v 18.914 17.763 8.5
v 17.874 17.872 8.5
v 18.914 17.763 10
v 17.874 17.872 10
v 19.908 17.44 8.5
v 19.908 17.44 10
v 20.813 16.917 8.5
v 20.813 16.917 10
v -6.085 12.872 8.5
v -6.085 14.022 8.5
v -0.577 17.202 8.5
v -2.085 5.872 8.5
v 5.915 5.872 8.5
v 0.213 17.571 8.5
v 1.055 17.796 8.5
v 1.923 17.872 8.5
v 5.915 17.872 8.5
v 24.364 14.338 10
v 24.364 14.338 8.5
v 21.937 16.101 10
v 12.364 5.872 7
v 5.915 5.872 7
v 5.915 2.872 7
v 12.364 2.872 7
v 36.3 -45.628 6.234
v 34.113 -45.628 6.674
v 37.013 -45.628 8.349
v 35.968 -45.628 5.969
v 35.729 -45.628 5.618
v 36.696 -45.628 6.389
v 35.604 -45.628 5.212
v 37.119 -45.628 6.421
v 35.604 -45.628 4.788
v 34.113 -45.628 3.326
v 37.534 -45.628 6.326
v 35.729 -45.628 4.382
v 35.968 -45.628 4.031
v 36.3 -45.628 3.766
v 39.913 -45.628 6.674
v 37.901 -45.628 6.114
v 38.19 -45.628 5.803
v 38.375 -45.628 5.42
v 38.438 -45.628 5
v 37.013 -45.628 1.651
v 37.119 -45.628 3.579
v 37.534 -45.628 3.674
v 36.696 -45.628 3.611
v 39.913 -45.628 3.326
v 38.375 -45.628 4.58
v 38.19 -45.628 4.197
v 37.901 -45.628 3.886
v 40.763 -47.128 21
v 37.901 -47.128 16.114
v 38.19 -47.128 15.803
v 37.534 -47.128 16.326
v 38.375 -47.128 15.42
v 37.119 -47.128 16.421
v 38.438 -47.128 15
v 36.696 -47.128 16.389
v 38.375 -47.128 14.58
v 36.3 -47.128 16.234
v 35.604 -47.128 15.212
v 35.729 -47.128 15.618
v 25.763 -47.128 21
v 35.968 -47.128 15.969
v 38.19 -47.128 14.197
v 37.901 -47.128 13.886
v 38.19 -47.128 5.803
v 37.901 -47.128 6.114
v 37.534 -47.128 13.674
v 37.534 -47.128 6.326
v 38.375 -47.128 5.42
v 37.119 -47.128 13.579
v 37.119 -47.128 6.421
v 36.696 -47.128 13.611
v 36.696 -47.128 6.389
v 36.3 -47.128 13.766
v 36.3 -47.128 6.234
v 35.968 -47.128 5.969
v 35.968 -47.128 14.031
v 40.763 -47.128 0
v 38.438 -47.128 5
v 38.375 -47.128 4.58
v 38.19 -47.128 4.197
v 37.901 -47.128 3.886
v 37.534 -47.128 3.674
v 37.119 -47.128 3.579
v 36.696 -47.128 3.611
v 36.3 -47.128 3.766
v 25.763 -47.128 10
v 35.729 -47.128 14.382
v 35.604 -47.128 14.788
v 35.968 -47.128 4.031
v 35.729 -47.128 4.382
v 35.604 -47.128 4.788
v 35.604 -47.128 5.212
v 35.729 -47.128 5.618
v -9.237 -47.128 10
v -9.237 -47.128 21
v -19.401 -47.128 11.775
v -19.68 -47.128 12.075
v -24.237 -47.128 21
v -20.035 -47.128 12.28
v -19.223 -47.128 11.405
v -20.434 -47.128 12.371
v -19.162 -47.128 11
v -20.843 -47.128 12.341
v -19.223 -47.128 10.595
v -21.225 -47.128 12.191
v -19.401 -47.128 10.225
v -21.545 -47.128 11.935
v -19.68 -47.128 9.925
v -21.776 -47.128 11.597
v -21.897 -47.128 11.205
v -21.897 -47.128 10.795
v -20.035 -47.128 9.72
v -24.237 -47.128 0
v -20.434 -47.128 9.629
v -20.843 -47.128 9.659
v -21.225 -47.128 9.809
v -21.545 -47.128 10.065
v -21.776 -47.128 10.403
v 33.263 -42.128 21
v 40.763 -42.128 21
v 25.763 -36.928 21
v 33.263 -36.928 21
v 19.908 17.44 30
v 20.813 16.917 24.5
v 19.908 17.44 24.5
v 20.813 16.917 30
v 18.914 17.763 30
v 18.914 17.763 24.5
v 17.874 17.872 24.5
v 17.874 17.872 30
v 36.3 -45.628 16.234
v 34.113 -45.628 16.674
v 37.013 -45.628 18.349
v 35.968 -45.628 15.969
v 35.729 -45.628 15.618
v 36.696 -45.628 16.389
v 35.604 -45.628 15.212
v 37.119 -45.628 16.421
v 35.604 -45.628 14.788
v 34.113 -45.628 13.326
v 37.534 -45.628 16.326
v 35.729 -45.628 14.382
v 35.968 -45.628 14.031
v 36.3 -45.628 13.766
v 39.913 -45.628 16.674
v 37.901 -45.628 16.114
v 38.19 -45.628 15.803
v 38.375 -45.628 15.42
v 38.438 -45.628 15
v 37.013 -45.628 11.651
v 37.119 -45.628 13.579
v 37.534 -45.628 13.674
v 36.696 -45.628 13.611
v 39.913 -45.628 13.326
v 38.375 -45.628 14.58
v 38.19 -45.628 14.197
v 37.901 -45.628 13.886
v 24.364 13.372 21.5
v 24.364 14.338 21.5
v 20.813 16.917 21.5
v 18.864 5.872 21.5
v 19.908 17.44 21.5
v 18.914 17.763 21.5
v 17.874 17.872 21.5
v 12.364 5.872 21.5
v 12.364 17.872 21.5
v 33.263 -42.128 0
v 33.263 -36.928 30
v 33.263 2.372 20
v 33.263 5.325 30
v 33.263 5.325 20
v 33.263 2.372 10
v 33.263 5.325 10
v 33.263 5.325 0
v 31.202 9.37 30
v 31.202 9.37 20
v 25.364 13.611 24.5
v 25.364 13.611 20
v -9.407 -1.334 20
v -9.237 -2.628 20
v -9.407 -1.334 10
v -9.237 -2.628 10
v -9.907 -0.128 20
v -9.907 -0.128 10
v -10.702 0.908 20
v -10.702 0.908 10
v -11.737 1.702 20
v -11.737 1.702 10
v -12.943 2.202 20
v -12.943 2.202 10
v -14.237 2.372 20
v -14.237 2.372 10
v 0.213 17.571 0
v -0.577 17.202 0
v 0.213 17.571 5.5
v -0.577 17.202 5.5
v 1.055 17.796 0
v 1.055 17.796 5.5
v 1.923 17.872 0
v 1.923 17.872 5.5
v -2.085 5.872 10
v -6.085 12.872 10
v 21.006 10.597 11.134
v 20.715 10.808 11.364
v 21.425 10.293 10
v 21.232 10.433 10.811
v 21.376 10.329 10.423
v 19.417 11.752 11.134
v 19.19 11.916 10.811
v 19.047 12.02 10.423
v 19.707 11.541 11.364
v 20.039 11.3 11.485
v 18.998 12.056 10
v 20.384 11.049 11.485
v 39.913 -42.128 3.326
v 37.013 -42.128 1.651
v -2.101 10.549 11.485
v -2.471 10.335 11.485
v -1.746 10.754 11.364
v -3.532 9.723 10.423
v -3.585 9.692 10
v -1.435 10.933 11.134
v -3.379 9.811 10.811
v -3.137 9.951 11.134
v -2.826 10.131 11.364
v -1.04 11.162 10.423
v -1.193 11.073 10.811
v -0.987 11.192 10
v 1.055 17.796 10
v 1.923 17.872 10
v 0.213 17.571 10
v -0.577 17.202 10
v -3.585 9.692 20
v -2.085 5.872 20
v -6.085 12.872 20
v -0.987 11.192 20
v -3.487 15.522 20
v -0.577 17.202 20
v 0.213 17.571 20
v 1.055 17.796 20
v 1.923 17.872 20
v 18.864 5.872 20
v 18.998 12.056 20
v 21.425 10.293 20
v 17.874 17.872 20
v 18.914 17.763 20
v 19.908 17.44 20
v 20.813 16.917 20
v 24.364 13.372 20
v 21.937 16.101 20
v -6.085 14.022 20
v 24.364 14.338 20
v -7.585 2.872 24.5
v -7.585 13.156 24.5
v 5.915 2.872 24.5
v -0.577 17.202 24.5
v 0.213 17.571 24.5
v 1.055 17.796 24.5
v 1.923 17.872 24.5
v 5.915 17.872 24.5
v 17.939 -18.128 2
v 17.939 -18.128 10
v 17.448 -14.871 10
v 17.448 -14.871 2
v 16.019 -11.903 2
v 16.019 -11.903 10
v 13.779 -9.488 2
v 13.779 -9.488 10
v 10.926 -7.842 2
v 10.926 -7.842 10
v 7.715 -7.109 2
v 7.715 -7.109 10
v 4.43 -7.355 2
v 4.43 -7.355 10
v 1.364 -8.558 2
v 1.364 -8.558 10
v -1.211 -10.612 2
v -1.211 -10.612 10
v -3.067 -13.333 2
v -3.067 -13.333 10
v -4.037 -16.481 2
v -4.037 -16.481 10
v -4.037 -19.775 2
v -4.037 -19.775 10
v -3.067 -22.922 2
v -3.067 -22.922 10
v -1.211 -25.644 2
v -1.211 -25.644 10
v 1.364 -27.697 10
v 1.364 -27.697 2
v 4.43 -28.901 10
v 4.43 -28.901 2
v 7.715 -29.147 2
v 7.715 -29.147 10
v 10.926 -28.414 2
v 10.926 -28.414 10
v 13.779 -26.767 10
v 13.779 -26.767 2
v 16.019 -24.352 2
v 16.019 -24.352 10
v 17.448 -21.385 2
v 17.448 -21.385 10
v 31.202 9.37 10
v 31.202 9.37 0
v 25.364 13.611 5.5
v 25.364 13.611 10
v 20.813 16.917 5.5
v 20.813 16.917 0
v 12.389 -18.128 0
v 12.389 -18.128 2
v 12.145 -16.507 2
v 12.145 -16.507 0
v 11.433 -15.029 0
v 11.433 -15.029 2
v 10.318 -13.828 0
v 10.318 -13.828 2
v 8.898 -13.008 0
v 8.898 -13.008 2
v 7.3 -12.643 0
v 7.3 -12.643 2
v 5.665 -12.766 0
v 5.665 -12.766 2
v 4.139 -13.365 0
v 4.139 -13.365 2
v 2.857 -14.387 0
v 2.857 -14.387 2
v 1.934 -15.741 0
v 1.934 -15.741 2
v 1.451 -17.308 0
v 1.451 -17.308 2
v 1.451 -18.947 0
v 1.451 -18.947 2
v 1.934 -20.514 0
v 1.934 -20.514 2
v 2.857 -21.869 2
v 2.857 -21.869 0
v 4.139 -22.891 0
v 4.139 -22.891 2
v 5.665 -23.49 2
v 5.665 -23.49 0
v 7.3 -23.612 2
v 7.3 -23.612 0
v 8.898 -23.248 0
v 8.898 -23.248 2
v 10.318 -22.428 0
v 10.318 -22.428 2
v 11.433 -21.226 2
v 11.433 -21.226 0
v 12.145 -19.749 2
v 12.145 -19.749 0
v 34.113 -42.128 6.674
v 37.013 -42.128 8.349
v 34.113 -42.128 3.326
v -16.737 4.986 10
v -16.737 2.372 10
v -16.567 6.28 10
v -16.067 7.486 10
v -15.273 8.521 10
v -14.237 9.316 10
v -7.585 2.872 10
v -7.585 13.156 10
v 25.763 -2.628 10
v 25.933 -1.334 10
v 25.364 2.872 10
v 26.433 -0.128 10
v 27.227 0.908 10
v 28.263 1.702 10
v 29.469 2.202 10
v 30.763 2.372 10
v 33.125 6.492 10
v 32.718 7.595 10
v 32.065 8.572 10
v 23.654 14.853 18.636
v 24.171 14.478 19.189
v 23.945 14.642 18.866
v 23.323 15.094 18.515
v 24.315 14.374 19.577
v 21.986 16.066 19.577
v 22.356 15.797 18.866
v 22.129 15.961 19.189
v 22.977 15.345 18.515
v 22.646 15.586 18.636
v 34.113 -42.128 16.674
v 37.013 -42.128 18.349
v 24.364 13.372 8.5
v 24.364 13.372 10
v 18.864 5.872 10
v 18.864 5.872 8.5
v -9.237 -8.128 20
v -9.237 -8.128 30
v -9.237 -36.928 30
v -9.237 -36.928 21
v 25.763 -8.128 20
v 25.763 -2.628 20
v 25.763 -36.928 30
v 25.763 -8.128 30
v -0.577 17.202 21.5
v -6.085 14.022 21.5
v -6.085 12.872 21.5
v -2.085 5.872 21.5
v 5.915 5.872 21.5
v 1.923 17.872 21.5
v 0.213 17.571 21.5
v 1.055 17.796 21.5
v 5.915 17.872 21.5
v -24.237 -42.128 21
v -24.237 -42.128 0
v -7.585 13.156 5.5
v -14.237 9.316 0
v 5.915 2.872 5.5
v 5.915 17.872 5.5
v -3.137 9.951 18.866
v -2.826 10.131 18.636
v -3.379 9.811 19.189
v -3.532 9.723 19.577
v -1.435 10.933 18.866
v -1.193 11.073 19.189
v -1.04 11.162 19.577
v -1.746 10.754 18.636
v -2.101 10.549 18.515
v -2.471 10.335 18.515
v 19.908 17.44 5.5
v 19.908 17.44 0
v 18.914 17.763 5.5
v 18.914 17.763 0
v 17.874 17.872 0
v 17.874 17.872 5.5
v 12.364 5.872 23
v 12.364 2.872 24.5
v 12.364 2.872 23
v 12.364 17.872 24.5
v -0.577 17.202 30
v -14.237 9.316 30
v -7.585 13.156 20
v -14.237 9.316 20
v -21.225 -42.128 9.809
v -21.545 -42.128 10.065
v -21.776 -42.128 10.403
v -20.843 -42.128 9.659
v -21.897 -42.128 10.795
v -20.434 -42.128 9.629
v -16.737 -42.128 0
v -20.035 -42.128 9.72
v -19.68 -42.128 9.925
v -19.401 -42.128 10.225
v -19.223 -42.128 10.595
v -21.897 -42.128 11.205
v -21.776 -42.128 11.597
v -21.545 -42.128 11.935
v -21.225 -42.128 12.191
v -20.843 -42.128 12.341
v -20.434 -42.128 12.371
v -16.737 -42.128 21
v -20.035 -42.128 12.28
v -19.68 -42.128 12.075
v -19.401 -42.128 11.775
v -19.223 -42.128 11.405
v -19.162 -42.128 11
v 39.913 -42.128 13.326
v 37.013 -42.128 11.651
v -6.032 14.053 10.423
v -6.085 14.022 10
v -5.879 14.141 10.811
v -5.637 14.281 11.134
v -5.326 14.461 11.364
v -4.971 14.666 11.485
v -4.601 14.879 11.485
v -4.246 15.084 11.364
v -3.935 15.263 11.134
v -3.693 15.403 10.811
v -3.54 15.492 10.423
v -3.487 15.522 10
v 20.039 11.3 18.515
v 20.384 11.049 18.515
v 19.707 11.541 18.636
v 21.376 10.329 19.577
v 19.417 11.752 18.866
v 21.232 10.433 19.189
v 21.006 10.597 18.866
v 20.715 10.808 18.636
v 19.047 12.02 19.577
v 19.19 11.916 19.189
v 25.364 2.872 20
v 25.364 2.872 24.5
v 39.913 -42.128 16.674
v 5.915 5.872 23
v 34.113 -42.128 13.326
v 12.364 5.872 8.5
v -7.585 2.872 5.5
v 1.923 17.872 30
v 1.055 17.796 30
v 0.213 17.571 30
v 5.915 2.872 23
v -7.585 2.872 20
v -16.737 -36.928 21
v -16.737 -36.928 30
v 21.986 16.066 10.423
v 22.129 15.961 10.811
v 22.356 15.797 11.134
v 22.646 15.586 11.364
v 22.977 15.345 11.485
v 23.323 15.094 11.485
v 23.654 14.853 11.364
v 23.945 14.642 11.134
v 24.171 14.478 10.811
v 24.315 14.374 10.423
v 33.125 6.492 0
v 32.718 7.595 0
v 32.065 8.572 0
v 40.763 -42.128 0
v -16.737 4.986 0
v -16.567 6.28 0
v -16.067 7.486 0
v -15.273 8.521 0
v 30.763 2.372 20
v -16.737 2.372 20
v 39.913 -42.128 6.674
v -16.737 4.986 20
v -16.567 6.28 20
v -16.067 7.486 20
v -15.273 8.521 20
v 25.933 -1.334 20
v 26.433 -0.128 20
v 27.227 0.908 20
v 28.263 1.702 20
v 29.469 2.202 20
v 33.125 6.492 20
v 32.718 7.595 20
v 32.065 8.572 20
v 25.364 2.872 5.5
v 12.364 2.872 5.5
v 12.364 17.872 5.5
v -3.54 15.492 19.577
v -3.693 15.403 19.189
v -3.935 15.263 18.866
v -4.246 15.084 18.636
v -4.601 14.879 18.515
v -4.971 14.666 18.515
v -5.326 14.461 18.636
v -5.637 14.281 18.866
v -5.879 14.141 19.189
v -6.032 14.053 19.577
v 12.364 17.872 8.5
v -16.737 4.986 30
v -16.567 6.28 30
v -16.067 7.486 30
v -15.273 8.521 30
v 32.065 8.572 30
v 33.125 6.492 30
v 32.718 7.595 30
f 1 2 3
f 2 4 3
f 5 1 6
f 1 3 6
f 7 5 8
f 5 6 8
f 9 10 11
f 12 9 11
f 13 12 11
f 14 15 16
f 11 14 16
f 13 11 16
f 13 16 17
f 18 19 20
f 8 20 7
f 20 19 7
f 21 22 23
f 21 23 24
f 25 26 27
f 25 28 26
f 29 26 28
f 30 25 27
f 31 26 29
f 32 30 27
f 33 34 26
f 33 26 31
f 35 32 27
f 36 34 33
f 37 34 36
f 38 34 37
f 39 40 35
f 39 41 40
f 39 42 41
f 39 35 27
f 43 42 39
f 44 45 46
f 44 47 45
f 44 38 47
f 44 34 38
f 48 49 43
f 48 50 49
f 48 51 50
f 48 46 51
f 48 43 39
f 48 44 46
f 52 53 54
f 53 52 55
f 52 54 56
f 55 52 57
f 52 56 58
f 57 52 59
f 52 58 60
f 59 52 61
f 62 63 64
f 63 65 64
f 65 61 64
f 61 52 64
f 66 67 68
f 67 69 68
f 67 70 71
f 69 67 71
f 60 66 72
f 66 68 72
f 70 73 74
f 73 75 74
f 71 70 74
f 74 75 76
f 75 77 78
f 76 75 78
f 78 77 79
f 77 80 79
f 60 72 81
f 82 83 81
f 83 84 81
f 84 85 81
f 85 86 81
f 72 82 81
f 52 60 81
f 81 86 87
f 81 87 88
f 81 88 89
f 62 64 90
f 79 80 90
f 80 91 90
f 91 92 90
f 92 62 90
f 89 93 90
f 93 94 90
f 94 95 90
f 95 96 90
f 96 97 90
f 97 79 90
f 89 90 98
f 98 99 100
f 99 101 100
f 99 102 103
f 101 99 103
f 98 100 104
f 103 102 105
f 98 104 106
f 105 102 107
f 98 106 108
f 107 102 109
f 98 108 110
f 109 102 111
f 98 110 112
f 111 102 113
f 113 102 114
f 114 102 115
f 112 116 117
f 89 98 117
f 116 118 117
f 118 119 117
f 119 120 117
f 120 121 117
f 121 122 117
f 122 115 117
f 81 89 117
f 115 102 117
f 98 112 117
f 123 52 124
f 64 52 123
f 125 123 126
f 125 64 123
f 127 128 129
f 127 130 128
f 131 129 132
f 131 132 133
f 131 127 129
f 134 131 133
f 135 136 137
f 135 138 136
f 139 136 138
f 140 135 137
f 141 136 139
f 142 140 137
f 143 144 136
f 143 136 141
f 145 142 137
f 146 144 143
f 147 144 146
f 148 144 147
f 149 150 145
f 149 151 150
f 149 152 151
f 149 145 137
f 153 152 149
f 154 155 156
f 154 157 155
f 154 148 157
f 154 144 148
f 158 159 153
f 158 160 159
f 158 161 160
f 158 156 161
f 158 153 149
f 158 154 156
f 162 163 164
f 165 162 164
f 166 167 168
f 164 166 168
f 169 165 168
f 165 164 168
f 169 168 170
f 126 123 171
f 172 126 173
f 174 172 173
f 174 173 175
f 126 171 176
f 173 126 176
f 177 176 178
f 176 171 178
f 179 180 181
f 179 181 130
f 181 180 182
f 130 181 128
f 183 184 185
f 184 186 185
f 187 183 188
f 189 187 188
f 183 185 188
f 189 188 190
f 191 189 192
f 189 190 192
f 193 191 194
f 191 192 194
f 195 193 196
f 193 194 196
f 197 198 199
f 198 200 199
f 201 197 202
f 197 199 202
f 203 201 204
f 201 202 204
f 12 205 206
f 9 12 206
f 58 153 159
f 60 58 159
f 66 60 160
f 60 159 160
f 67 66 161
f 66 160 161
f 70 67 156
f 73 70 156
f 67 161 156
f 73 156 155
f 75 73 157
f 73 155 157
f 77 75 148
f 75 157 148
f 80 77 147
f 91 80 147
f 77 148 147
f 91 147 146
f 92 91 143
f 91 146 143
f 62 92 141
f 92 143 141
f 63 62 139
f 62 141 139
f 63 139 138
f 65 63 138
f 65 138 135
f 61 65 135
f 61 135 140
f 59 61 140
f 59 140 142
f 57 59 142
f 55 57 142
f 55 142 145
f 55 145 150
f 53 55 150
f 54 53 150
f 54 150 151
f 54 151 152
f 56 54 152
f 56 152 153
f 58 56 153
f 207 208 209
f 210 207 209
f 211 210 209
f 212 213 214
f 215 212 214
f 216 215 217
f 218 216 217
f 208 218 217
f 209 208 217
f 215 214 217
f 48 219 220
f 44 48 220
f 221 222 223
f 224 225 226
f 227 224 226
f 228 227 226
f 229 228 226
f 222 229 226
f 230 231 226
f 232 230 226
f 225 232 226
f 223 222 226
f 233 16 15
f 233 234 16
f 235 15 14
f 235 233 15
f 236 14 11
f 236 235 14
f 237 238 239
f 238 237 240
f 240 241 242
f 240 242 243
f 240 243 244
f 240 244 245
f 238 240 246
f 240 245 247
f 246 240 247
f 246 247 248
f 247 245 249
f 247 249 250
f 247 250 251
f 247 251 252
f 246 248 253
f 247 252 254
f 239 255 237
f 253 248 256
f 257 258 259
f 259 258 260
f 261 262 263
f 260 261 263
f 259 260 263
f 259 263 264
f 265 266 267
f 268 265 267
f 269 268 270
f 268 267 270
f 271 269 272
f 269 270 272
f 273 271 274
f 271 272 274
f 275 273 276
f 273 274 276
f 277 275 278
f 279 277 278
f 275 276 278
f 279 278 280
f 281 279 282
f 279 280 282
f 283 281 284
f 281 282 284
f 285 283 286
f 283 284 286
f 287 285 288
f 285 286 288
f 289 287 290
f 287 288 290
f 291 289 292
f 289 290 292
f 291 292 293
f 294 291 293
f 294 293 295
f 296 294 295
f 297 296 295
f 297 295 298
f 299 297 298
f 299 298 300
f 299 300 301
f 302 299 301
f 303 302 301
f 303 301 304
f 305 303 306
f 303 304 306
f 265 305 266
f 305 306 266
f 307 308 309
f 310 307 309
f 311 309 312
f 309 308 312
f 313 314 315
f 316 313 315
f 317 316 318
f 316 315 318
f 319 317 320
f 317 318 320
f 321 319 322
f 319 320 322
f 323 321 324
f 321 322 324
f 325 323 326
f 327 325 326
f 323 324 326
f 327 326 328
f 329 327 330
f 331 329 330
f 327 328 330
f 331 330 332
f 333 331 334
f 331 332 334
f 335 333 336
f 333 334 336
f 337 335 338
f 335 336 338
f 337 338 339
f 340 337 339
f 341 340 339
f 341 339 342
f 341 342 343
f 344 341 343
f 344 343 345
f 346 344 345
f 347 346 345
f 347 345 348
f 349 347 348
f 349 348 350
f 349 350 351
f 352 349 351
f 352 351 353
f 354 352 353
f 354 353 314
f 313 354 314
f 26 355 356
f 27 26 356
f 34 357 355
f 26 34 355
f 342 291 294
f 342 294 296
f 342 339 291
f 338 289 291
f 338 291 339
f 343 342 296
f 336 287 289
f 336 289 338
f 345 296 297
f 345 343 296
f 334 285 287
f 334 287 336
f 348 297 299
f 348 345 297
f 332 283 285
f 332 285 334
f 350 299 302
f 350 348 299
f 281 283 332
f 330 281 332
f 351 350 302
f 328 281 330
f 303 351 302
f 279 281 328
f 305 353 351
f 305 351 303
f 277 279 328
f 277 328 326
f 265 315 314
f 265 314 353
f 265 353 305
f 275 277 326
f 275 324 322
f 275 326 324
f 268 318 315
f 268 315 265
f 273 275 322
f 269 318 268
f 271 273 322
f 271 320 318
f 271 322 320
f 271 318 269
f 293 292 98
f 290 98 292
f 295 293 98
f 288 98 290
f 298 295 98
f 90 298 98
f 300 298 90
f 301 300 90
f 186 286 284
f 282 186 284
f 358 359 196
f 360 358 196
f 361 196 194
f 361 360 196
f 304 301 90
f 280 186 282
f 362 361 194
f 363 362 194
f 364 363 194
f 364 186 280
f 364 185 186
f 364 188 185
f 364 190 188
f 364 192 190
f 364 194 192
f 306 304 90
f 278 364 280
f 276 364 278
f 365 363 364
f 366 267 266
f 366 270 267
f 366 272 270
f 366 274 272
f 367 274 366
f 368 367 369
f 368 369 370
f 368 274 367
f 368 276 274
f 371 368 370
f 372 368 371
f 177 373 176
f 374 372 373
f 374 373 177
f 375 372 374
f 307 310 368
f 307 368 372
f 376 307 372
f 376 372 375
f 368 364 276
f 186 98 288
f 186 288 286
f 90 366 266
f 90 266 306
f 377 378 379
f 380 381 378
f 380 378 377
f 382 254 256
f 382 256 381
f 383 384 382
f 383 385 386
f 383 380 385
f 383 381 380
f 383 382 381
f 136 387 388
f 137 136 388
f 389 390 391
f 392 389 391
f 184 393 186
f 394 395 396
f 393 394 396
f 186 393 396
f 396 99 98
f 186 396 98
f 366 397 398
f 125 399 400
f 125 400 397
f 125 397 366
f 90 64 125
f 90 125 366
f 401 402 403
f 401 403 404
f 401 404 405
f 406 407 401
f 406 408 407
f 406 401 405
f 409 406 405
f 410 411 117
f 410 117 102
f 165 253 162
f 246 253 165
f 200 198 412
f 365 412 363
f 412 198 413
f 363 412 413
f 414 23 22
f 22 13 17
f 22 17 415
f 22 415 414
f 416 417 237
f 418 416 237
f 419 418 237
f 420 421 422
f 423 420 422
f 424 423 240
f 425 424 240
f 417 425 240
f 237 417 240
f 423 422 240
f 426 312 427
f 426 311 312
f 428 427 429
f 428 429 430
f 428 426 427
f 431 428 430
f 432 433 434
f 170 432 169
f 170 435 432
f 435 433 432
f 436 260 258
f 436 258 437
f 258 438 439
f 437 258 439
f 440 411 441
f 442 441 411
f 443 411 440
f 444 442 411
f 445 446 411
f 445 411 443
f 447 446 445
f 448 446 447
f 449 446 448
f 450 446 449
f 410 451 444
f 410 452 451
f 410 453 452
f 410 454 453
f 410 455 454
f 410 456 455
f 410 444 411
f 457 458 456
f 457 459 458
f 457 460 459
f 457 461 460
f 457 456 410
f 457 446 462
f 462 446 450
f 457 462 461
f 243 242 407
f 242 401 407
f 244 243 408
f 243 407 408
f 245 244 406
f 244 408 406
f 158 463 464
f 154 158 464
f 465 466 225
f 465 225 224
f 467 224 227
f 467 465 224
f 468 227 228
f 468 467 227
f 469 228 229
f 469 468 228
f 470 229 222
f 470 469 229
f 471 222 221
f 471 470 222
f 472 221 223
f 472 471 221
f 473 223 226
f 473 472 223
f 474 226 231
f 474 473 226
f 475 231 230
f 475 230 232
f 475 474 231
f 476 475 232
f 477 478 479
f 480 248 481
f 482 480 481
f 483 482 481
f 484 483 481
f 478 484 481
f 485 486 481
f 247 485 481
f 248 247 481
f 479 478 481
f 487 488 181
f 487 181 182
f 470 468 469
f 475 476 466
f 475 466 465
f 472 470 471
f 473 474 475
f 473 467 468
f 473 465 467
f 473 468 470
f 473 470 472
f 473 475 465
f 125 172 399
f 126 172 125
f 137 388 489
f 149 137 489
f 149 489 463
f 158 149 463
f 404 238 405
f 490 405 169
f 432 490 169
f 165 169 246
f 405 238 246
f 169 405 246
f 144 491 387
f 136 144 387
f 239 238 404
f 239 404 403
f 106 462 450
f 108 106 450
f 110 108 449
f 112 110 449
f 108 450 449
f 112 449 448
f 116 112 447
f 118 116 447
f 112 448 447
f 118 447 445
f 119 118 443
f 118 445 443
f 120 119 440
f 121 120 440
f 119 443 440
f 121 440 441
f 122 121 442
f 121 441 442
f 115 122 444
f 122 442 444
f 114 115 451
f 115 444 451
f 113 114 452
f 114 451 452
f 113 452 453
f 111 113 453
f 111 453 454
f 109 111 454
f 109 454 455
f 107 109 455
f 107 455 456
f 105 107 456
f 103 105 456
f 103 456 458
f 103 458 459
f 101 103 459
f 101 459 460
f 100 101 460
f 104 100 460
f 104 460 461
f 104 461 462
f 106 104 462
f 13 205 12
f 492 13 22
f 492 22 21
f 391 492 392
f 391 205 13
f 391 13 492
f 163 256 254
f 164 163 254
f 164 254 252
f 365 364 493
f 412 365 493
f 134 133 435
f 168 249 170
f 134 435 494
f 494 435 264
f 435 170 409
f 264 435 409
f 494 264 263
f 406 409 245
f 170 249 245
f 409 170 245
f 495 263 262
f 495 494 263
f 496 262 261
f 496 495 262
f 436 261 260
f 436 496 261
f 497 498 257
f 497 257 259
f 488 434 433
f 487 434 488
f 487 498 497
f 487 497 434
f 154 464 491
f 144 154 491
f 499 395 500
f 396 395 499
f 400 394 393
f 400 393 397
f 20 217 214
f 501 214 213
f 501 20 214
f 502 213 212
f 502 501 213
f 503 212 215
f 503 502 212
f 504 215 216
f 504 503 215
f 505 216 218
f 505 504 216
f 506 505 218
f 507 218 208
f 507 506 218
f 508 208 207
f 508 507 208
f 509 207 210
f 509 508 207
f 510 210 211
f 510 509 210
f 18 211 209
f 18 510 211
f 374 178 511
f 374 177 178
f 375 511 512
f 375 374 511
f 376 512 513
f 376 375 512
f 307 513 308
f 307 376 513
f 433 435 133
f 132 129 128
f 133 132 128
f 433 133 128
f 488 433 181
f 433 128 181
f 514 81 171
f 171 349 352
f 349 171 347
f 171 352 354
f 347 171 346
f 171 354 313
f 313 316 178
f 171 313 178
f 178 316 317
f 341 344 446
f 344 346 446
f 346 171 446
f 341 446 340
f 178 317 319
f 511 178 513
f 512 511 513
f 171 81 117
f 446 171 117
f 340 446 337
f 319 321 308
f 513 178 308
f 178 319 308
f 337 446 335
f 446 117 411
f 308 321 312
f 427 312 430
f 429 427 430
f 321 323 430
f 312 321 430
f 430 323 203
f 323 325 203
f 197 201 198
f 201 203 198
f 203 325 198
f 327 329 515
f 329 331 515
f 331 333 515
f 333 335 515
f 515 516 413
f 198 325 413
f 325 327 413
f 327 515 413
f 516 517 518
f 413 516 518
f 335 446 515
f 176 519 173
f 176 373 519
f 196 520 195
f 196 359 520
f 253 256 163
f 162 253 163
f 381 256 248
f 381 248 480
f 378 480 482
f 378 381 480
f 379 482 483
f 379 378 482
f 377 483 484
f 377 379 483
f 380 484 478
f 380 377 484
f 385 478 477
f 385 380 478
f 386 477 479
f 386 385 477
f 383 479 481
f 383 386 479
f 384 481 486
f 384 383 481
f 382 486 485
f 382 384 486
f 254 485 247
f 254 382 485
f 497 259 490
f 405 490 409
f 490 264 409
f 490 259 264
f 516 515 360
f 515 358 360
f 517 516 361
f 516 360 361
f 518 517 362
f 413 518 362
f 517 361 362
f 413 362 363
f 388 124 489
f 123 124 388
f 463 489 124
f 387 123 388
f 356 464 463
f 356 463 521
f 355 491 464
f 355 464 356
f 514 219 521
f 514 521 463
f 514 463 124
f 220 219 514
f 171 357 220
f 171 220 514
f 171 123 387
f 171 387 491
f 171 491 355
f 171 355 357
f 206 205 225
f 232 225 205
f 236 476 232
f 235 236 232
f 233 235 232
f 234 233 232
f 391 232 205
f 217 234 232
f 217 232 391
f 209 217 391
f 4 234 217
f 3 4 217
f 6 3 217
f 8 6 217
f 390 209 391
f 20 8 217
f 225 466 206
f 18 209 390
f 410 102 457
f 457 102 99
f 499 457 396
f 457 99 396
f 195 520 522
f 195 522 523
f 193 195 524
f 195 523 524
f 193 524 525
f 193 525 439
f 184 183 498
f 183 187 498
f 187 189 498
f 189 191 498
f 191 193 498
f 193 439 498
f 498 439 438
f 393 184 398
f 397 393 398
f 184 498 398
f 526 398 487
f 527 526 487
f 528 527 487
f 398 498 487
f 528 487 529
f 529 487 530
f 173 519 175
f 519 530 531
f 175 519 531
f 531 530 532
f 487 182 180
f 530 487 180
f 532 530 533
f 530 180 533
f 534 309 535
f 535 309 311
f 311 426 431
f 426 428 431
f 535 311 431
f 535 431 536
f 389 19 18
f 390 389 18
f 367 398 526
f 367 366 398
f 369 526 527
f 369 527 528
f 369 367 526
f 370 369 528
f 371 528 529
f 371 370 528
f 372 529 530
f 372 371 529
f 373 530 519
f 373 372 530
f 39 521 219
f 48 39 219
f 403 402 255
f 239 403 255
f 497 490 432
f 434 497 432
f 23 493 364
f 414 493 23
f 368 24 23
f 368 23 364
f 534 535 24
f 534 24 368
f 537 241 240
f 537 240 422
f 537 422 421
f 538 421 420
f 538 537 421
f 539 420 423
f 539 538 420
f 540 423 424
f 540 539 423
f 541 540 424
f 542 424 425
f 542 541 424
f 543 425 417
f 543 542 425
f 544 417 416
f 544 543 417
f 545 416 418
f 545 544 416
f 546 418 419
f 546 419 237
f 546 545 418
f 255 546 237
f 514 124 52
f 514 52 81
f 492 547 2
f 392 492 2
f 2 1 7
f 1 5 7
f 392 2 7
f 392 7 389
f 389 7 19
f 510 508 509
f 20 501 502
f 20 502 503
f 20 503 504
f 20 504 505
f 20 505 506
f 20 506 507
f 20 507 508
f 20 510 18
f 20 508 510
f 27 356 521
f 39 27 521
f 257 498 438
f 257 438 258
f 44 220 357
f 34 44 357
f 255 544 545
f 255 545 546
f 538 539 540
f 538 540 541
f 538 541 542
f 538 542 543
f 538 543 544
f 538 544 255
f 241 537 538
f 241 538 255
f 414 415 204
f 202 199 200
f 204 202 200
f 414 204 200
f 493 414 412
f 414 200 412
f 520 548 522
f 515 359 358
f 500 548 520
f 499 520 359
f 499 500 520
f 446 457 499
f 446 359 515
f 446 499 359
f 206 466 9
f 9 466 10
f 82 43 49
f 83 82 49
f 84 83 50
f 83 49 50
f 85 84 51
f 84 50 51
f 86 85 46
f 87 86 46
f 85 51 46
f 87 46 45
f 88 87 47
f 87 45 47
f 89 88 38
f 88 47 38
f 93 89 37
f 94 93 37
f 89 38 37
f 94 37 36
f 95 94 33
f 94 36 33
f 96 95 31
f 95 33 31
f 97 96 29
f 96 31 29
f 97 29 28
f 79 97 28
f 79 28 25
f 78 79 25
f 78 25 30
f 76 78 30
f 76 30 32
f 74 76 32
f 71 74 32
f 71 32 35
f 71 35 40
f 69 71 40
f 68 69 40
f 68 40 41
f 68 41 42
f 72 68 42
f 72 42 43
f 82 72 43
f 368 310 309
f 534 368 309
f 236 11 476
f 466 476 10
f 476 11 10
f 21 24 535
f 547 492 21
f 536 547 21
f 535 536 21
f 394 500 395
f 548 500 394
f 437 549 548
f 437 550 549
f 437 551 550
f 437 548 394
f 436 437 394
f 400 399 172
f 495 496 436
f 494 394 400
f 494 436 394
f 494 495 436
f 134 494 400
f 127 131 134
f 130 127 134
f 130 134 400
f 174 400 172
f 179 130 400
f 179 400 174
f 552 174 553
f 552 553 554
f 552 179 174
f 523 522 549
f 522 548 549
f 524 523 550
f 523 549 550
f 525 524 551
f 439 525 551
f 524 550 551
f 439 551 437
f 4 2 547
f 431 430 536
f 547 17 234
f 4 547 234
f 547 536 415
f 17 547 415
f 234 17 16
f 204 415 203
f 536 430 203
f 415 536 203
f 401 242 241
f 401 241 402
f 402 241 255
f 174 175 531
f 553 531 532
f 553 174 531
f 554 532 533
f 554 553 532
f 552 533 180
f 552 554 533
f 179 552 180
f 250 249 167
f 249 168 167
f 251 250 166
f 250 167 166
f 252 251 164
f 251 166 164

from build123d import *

# Parameters (mm, degrees)
BOSS_EXTRUDE1_DEPTH      = 30
SKETCH2_W                = 50
SKETCH2_H                = 10
CUT_EXTRUDE1_DEPTH       = 25
SKETCH4_R                = 1.5
BOSS_EXTRUDE2_DEPTH      = 5
SKETCH6_W                = 5.331604391
SKETCH6_H                = 3
SKETCH6_W_2              = 6.668395609
SKETCH6_W_3              = 12
SKETCH6_W_4              = 1.5
SKETCH6_H_2              = 4.5
CUT_EXTRUDE15_DEPTH      = 15
SKETCH7_W                = 30.5
SKETCH7_H                = 3
CUT_EXTRUDE16_DEPTH      = 13
CUT_EXTRUDE16_DEPTH_BACK = 3
SKETCH8_W                = 35
SKETCH8_H                = 39
CUT_EXTRUDE17_DEPTH      = 10
SKETCH3_W                = 35
SKETCH3_H                = 10
CUT_EXTRUDE18_DEPTH      = 40
SKETCH9_R                = 11.05
CUT_EXTRUDE19_DEPTH      = 8
FILLET5_R                = 5
FILLET6_R                = 5
FILLET7_R                = 5
FILLET8_R                = 5
FILLET9_R                = 5
FILLET10_R               = 5
SKETCH10_W               = 9
SKETCH10_H               = 10.2
CUT_EXTRUDE20_DEPTH      = 51
SKETCH11_R               = 1.5
BOSS_EXTRUDE3_DEPTH      = 5
SKETCH13_W               = 7.135367733
SKETCH13_H               = 3
SKETCH13_W_2             = 4.864632267
SKETCH13_W_3             = 12
CUT_EXTRUDE22_DEPTH      = 15
SKETCH14_W               = 21
SKETCH14_H               = 5
BOSS_EXTRUDE4_DEPTH      = 7.5
SKETCH15_W               = 21
SKETCH15_H               = 5
BOSS_EXTRUDE5_DEPTH      = 7.5
CUT_EXTRUDE23_DEPTH      = 3.5
SKETCH17_R               = 1.425
CUT_EXTRUDE24_DEPTH      = 2.5
SKETCH19_W               = 7.5
SKETCH19_H               = 10
BOSS_EXTRUDE7_DEPTH      = 9.5
FILLET14_R               = 5
FILLET18_R               = 5
FILLET19_R               = 5
FILLET20_R               = 5
FILLET21_R               = 5
FILLET22_R               = 5
FILLET23_R               = 5
FILLET24_R               = 5
SKETCH20_R               = 1.375
CUT_EXTRUDE25_DEPTH      = 10
SKETCH21_R               = 5.5
CUT_EXTRUDE26_DEPTH      = 10
CUT_EXTRUDE27_DEPTH      = 14
CUT_EXTRUDE27_DEPTH_BACK = 3


with BuildPart() as part:
    # Sketch1 → Boss-Extrude1 (new body)
    with BuildSketch(Plane.XY):
        Polygon((19.499094274, 17.872269618), (0.583421555, 17.872269618), (-16.737086521, 7.872269618), (-16.737086521, -47.127730382), (33.262913479, -47.127730382), (33.262913479, 7.872269618), align=None)
    extrude(amount=BOSS_EXTRUDE1_DEPTH)

    # Sketch2 → Cut-Extrude1 (cut)
    with BuildSketch(Plane(origin=(0, 17.872269618, 0), x_dir=(1, 0, 0), z_dir=(0, 1, 0))):
        with Locations((8.262913479, -15)):
            Rectangle(SKETCH2_W, SKETCH2_H)
    extrude(amount=-CUT_EXTRUDE1_DEPTH, mode=Mode.SUBTRACT)

    # Sketch4 → Boss-Extrude2 (add)
    with BuildSketch(Plane(origin=(-7.593064367, 13.151573269, 0), x_dir=(0, 0, 1), z_dir=(-0.5, 0.866025404, 0))):
        with Locations((10, 3.241392696)):
            Circle(SKETCH4_R)
        with Locations((20, 3.241392696)):
            Circle(SKETCH4_R)
    extrude(amount=-BOSS_EXTRUDE2_DEPTH)

    # Sketch6 → Cut-Extrude15 (cut)
    with BuildSketch(Plane(origin=(0, 17.872269618, 0), x_dir=(1, 0, 0), z_dir=(0, 1, 0))):
        with Locations((3.249223751, -7)):
            Rectangle(SKETCH6_W, SKETCH6_H)
        with Locations((-2.75077625, -7)):
            Rectangle(SKETCH6_W_2, SKETCH6_H)
        with Locations((-0.084974054, -23)):
            Rectangle(SKETCH6_W_3, SKETCH6_H)
        Polygon((-6.084974054, -24.5), (-6.084974054, -21.5), (-6.084974054, -20), (-7.584974054, -20), (-7.584974054, -24.5), align=None)
        with Locations((-6.834974054, -7.75)):
            Rectangle(SKETCH6_W_4, SKETCH6_H_2)
    extrude(amount=-CUT_EXTRUDE15_DEPTH, mode=Mode.SUBTRACT)

    # Sketch7 → Cut-Extrude16 (cut, two sides)
    with BuildSketch(Plane.XY.offset(10)) as cut_extrude16_sk:
        with Locations((9.165025946, 4.372269618)):
            Rectangle(SKETCH7_W, SKETCH7_H)
    extrude(amount=CUT_EXTRUDE16_DEPTH, mode=Mode.SUBTRACT)
    extrude(cut_extrude16_sk.sketch, amount=-CUT_EXTRUDE16_DEPTH_BACK, mode=Mode.SUBTRACT)

    # Sketch8 → Cut-Extrude17 (cut)
    with BuildSketch(Plane.XY.offset(30)):
        with Locations((8.262913479, -27.627730382)):
            Rectangle(SKETCH8_W, SKETCH8_H)
    extrude(amount=-CUT_EXTRUDE17_DEPTH, mode=Mode.SUBTRACT)

    # Sketch3 → Cut-Extrude18 (cut)
    with BuildSketch(Plane.XZ.offset(47.127730382)):
        with Locations((8.262913479, 15)):
            Rectangle(SKETCH3_W, SKETCH3_H)
    extrude(amount=-CUT_EXTRUDE18_DEPTH, mode=Mode.SUBTRACT)

    # Sketch9 → Cut-Extrude19 (cut)
    with BuildSketch(Plane.XY.offset(10)):
        with Locations((6.889118081, -18.127730382)):
            Circle(SKETCH9_R)
    extrude(amount=-CUT_EXTRUDE19_DEPTH, mode=Mode.SUBTRACT)

    # Fillet5
    fillet5_edges = [part.edges().sort_by_distance(p)[0] for p in [
        (-16.737086521, 7.872269618, 5),
    ]]
    fillet(fillet5_edges, radius=FILLET5_R)

    # Fillet6
    fillet6_edges = [part.edges().sort_by_distance(p)[0] for p in [
        (-16.737086521, 7.872269618, 25),
    ]]
    fillet(fillet6_edges, radius=FILLET6_R)

    # Fillet7
    fillet7_edges = [part.edges().sort_by_distance(p)[0] for p in [
        (0.583421555, 17.872269618, 2.75),
    ]]
    fillet(fillet7_edges, radius=FILLET7_R)

    # Fillet8
    fillet8_edges = [part.edges().sort_by_distance(p)[0] for p in [
        (0.583421555, 17.872269618, 9.25),
    ]]
    fillet(fillet8_edges, radius=FILLET8_R)

    # Fillet9
    fillet9_edges = [part.edges().sort_by_distance(p)[0] for p in [
        (0.583421555, 17.872269618, 20.75),
    ]]
    fillet(fillet9_edges, radius=FILLET9_R)

    # Fillet10
    fillet10_edges = [part.edges().sort_by_distance(p)[0] for p in [
        (0.583421555, 17.872269618, 27.25),
    ]]
    fillet(fillet10_edges, radius=FILLET10_R)

    # Sketch10 → Cut-Extrude20 (cut, through all)
    with BuildSketch(Plane(origin=(33.262913479, 0, 0), x_dir=(0, 0, -1), z_dir=(1, 0, 0))):
        with Locations((-25.5, -42.027730382)):
            Rectangle(SKETCH10_W, SKETCH10_H)
    extrude(amount=-CUT_EXTRUDE20_DEPTH, mode=Mode.SUBTRACT)

    # Sketch11 → Boss-Extrude3 (add)
    with BuildSketch(Plane(origin=(15.235540625, 20.969922665, 0), x_dir=(0, 0, -1), z_dir=(0.587785252, 0.809016994, 0))):
        with Locations((-20, -9.783058304)):
            Circle(SKETCH11_R)
        with Locations((-10, -9.783058304)):
            Circle(SKETCH11_R)
    extrude(amount=-BOSS_EXTRUDE3_DEPTH)

    # Sketch13 → Cut-Extrude22 (cut)
    with BuildSketch(Plane(origin=(0, 17.872269618, 0), x_dir=(1, 0, 0), z_dir=(0, 1, 0))):
        with Locations((15.931410407, -23)):
            Rectangle(SKETCH13_W, SKETCH13_H)
        with Locations((21.931410408, -23)):
            Rectangle(SKETCH13_W_2, SKETCH13_H)
        Polygon((24.363726541, -21.5), (24.363726541, -24.5), (25.363726541, -24.5), (25.363726541, -14.929315396), (24.363726541, -14.929315396), align=None)
        Polygon((24.363726541, -5.5), (24.363726541, -8.5), (24.363726541, -11.278829463), (25.363726541, -11.278829463), (25.363726541, -5.5), align=None)
        with Locations((18.363726541, -7)):
            Rectangle(SKETCH13_W_3, SKETCH13_H)
    extrude(amount=-CUT_EXTRUDE22_DEPTH, mode=Mode.SUBTRACT)

    # Sketch14 → Boss-Extrude4 (add)
    with BuildSketch(Plane.ZY.offset(16.737086521)):
        with Locations((10.5, -44.627730382)):
            Rectangle(SKETCH14_W, SKETCH14_H)
    extrude(amount=BOSS_EXTRUDE4_DEPTH)

    # Sketch15 → Boss-Extrude5 (add)
    with BuildSketch(Plane(origin=(33.262913479, 0, 0), x_dir=(0, 0, -1), z_dir=(1, 0, 0))):
        with Locations((-10.5, -44.627730382)):
            Rectangle(SKETCH15_W, SKETCH15_H)
    extrude(amount=BOSS_EXTRUDE5_DEPTH)

    # Sketch16 → Cut-Extrude23 (cut)
    with BuildSketch(Plane(origin=(0, -42.127730382, 0), x_dir=(1, 0, 0), z_dir=(0, 1, 0))):
        Polygon((37.012913479, -11.651368439), (34.112913479, -13.325684219), (34.112913479, -16.674315781), (37.012913479, -18.348631561), (39.912913479, -16.674315781), (39.912913479, -13.325684219), align=None)
        Polygon((37.012913479, -1.651368439), (34.112913479, -3.325684219), (34.112913479, -6.674315781), (37.012913479, -8.348631561), (39.912913479, -6.674315781), (39.912913479, -3.325684219), align=None)
    extrude(amount=-CUT_EXTRUDE23_DEPTH, mode=Mode.SUBTRACT)

    # Sketch17 → Cut-Extrude24 (cut, through all)
    with BuildSketch(Plane(origin=(0, -45.627730382, 0), x_dir=(1, 0, 0), z_dir=(0, 1, 0))):
        with Locations((37.012913479, -15)):
            Circle(SKETCH17_R)
        with Locations((37.012913479, -5)):
            Circle(SKETCH17_R)
    extrude(amount=-CUT_EXTRUDE24_DEPTH, mode=Mode.SUBTRACT)

    # Sketch19 → Boss-Extrude7 (add)
    with BuildSketch(Plane(origin=(0, -7.127730382, 0), x_dir=(1, 0, 0), z_dir=(0, 1, 0))):
        with Locations((-12.987086521, -15)):
            Rectangle(SKETCH19_W, SKETCH19_H)
        with Locations((29.512913479, -15)):
            Rectangle(SKETCH19_W, SKETCH19_H)
    extrude(amount=BOSS_EXTRUDE7_DEPTH)

    # Fillet14
    fillet14_edges = [part.edges().sort_by_distance(p)[0] for p in [
        (-9.237086521, 2.372269618, 15),
    ]]
    fillet(fillet14_edges, radius=FILLET14_R)

    # Fillet18
    fillet18_edges = [part.edges().sort_by_distance(p)[0] for p in [
        (25.762913479, 2.372269618, 15),
    ]]
    fillet(fillet18_edges, radius=FILLET18_R)

    # Fillet19
    fillet19_edges = [part.edges().sort_by_distance(p)[0] for p in [
        (33.262913479, 7.872269618, 5),
    ]]
    fillet(fillet19_edges, radius=FILLET19_R)

    # Fillet20
    fillet20_edges = [part.edges().sort_by_distance(p)[0] for p in [
        (33.262913479, 7.872269618, 25),
    ]]
    fillet(fillet20_edges, radius=FILLET20_R)

    # Fillet21
    fillet21_edges = [part.edges().sort_by_distance(p)[0] for p in [
        (19.499094274, 17.872269618, 2.75),
    ]]
    fillet(fillet21_edges, radius=FILLET21_R)

    # Fillet22
    fillet22_edges = [part.edges().sort_by_distance(p)[0] for p in [
        (19.499094274, 17.872269618, 9.25),
    ]]
    fillet(fillet22_edges, radius=FILLET22_R)

    # Fillet23
    fillet23_edges = [part.edges().sort_by_distance(p)[0] for p in [
        (19.499094274, 17.872269618, 27.25),
    ]]
    fillet(fillet23_edges, radius=FILLET23_R)

    # Fillet24
    fillet24_edges = [part.edges().sort_by_distance(p)[0] for p in [
        (19.499094274, 17.872269618, 20.75),
    ]]
    fillet(fillet24_edges, radius=FILLET24_R)

    # Sketch20 → Cut-Extrude25 (cut)
    with BuildSketch(Plane(origin=(0, -42.127730382, 0), x_dir=(1, 0, 0), z_dir=(0, 1, 0))):
        with Locations((-20.537086521, -11)):
            Circle(SKETCH20_R)
    extrude(amount=-CUT_EXTRUDE25_DEPTH, mode=Mode.SUBTRACT)

    # Sketch21 → Cut-Extrude26 (cut)
    with BuildSketch(Plane.XY.offset(2)):
        with Locations((6.889118081, -18.127730382)):
            Circle(SKETCH21_R)
    extrude(amount=-CUT_EXTRUDE26_DEPTH, mode=Mode.SUBTRACT)

    # Sketch22 → Cut-Extrude27 (cut, two sides)
    with BuildSketch(Plane.XY.offset(10)) as cut_extrude27_sk:
        Polygon((-2.084974054, 5.872269618), (-6.084974054, 12.872269618), (-6.084974054, 5.872269618), align=None)
        Polygon((24.363726541, 13.372269618), (18.863726541, 5.872269618), (24.363726541, 5.872269618), align=None)
    extrude(amount=CUT_EXTRUDE27_DEPTH, mode=Mode.SUBTRACT)
    extrude(cut_extrude27_sk.sketch, amount=-CUT_EXTRUDE27_DEPTH_BACK, mode=Mode.SUBTRACT)


solid = part.part
